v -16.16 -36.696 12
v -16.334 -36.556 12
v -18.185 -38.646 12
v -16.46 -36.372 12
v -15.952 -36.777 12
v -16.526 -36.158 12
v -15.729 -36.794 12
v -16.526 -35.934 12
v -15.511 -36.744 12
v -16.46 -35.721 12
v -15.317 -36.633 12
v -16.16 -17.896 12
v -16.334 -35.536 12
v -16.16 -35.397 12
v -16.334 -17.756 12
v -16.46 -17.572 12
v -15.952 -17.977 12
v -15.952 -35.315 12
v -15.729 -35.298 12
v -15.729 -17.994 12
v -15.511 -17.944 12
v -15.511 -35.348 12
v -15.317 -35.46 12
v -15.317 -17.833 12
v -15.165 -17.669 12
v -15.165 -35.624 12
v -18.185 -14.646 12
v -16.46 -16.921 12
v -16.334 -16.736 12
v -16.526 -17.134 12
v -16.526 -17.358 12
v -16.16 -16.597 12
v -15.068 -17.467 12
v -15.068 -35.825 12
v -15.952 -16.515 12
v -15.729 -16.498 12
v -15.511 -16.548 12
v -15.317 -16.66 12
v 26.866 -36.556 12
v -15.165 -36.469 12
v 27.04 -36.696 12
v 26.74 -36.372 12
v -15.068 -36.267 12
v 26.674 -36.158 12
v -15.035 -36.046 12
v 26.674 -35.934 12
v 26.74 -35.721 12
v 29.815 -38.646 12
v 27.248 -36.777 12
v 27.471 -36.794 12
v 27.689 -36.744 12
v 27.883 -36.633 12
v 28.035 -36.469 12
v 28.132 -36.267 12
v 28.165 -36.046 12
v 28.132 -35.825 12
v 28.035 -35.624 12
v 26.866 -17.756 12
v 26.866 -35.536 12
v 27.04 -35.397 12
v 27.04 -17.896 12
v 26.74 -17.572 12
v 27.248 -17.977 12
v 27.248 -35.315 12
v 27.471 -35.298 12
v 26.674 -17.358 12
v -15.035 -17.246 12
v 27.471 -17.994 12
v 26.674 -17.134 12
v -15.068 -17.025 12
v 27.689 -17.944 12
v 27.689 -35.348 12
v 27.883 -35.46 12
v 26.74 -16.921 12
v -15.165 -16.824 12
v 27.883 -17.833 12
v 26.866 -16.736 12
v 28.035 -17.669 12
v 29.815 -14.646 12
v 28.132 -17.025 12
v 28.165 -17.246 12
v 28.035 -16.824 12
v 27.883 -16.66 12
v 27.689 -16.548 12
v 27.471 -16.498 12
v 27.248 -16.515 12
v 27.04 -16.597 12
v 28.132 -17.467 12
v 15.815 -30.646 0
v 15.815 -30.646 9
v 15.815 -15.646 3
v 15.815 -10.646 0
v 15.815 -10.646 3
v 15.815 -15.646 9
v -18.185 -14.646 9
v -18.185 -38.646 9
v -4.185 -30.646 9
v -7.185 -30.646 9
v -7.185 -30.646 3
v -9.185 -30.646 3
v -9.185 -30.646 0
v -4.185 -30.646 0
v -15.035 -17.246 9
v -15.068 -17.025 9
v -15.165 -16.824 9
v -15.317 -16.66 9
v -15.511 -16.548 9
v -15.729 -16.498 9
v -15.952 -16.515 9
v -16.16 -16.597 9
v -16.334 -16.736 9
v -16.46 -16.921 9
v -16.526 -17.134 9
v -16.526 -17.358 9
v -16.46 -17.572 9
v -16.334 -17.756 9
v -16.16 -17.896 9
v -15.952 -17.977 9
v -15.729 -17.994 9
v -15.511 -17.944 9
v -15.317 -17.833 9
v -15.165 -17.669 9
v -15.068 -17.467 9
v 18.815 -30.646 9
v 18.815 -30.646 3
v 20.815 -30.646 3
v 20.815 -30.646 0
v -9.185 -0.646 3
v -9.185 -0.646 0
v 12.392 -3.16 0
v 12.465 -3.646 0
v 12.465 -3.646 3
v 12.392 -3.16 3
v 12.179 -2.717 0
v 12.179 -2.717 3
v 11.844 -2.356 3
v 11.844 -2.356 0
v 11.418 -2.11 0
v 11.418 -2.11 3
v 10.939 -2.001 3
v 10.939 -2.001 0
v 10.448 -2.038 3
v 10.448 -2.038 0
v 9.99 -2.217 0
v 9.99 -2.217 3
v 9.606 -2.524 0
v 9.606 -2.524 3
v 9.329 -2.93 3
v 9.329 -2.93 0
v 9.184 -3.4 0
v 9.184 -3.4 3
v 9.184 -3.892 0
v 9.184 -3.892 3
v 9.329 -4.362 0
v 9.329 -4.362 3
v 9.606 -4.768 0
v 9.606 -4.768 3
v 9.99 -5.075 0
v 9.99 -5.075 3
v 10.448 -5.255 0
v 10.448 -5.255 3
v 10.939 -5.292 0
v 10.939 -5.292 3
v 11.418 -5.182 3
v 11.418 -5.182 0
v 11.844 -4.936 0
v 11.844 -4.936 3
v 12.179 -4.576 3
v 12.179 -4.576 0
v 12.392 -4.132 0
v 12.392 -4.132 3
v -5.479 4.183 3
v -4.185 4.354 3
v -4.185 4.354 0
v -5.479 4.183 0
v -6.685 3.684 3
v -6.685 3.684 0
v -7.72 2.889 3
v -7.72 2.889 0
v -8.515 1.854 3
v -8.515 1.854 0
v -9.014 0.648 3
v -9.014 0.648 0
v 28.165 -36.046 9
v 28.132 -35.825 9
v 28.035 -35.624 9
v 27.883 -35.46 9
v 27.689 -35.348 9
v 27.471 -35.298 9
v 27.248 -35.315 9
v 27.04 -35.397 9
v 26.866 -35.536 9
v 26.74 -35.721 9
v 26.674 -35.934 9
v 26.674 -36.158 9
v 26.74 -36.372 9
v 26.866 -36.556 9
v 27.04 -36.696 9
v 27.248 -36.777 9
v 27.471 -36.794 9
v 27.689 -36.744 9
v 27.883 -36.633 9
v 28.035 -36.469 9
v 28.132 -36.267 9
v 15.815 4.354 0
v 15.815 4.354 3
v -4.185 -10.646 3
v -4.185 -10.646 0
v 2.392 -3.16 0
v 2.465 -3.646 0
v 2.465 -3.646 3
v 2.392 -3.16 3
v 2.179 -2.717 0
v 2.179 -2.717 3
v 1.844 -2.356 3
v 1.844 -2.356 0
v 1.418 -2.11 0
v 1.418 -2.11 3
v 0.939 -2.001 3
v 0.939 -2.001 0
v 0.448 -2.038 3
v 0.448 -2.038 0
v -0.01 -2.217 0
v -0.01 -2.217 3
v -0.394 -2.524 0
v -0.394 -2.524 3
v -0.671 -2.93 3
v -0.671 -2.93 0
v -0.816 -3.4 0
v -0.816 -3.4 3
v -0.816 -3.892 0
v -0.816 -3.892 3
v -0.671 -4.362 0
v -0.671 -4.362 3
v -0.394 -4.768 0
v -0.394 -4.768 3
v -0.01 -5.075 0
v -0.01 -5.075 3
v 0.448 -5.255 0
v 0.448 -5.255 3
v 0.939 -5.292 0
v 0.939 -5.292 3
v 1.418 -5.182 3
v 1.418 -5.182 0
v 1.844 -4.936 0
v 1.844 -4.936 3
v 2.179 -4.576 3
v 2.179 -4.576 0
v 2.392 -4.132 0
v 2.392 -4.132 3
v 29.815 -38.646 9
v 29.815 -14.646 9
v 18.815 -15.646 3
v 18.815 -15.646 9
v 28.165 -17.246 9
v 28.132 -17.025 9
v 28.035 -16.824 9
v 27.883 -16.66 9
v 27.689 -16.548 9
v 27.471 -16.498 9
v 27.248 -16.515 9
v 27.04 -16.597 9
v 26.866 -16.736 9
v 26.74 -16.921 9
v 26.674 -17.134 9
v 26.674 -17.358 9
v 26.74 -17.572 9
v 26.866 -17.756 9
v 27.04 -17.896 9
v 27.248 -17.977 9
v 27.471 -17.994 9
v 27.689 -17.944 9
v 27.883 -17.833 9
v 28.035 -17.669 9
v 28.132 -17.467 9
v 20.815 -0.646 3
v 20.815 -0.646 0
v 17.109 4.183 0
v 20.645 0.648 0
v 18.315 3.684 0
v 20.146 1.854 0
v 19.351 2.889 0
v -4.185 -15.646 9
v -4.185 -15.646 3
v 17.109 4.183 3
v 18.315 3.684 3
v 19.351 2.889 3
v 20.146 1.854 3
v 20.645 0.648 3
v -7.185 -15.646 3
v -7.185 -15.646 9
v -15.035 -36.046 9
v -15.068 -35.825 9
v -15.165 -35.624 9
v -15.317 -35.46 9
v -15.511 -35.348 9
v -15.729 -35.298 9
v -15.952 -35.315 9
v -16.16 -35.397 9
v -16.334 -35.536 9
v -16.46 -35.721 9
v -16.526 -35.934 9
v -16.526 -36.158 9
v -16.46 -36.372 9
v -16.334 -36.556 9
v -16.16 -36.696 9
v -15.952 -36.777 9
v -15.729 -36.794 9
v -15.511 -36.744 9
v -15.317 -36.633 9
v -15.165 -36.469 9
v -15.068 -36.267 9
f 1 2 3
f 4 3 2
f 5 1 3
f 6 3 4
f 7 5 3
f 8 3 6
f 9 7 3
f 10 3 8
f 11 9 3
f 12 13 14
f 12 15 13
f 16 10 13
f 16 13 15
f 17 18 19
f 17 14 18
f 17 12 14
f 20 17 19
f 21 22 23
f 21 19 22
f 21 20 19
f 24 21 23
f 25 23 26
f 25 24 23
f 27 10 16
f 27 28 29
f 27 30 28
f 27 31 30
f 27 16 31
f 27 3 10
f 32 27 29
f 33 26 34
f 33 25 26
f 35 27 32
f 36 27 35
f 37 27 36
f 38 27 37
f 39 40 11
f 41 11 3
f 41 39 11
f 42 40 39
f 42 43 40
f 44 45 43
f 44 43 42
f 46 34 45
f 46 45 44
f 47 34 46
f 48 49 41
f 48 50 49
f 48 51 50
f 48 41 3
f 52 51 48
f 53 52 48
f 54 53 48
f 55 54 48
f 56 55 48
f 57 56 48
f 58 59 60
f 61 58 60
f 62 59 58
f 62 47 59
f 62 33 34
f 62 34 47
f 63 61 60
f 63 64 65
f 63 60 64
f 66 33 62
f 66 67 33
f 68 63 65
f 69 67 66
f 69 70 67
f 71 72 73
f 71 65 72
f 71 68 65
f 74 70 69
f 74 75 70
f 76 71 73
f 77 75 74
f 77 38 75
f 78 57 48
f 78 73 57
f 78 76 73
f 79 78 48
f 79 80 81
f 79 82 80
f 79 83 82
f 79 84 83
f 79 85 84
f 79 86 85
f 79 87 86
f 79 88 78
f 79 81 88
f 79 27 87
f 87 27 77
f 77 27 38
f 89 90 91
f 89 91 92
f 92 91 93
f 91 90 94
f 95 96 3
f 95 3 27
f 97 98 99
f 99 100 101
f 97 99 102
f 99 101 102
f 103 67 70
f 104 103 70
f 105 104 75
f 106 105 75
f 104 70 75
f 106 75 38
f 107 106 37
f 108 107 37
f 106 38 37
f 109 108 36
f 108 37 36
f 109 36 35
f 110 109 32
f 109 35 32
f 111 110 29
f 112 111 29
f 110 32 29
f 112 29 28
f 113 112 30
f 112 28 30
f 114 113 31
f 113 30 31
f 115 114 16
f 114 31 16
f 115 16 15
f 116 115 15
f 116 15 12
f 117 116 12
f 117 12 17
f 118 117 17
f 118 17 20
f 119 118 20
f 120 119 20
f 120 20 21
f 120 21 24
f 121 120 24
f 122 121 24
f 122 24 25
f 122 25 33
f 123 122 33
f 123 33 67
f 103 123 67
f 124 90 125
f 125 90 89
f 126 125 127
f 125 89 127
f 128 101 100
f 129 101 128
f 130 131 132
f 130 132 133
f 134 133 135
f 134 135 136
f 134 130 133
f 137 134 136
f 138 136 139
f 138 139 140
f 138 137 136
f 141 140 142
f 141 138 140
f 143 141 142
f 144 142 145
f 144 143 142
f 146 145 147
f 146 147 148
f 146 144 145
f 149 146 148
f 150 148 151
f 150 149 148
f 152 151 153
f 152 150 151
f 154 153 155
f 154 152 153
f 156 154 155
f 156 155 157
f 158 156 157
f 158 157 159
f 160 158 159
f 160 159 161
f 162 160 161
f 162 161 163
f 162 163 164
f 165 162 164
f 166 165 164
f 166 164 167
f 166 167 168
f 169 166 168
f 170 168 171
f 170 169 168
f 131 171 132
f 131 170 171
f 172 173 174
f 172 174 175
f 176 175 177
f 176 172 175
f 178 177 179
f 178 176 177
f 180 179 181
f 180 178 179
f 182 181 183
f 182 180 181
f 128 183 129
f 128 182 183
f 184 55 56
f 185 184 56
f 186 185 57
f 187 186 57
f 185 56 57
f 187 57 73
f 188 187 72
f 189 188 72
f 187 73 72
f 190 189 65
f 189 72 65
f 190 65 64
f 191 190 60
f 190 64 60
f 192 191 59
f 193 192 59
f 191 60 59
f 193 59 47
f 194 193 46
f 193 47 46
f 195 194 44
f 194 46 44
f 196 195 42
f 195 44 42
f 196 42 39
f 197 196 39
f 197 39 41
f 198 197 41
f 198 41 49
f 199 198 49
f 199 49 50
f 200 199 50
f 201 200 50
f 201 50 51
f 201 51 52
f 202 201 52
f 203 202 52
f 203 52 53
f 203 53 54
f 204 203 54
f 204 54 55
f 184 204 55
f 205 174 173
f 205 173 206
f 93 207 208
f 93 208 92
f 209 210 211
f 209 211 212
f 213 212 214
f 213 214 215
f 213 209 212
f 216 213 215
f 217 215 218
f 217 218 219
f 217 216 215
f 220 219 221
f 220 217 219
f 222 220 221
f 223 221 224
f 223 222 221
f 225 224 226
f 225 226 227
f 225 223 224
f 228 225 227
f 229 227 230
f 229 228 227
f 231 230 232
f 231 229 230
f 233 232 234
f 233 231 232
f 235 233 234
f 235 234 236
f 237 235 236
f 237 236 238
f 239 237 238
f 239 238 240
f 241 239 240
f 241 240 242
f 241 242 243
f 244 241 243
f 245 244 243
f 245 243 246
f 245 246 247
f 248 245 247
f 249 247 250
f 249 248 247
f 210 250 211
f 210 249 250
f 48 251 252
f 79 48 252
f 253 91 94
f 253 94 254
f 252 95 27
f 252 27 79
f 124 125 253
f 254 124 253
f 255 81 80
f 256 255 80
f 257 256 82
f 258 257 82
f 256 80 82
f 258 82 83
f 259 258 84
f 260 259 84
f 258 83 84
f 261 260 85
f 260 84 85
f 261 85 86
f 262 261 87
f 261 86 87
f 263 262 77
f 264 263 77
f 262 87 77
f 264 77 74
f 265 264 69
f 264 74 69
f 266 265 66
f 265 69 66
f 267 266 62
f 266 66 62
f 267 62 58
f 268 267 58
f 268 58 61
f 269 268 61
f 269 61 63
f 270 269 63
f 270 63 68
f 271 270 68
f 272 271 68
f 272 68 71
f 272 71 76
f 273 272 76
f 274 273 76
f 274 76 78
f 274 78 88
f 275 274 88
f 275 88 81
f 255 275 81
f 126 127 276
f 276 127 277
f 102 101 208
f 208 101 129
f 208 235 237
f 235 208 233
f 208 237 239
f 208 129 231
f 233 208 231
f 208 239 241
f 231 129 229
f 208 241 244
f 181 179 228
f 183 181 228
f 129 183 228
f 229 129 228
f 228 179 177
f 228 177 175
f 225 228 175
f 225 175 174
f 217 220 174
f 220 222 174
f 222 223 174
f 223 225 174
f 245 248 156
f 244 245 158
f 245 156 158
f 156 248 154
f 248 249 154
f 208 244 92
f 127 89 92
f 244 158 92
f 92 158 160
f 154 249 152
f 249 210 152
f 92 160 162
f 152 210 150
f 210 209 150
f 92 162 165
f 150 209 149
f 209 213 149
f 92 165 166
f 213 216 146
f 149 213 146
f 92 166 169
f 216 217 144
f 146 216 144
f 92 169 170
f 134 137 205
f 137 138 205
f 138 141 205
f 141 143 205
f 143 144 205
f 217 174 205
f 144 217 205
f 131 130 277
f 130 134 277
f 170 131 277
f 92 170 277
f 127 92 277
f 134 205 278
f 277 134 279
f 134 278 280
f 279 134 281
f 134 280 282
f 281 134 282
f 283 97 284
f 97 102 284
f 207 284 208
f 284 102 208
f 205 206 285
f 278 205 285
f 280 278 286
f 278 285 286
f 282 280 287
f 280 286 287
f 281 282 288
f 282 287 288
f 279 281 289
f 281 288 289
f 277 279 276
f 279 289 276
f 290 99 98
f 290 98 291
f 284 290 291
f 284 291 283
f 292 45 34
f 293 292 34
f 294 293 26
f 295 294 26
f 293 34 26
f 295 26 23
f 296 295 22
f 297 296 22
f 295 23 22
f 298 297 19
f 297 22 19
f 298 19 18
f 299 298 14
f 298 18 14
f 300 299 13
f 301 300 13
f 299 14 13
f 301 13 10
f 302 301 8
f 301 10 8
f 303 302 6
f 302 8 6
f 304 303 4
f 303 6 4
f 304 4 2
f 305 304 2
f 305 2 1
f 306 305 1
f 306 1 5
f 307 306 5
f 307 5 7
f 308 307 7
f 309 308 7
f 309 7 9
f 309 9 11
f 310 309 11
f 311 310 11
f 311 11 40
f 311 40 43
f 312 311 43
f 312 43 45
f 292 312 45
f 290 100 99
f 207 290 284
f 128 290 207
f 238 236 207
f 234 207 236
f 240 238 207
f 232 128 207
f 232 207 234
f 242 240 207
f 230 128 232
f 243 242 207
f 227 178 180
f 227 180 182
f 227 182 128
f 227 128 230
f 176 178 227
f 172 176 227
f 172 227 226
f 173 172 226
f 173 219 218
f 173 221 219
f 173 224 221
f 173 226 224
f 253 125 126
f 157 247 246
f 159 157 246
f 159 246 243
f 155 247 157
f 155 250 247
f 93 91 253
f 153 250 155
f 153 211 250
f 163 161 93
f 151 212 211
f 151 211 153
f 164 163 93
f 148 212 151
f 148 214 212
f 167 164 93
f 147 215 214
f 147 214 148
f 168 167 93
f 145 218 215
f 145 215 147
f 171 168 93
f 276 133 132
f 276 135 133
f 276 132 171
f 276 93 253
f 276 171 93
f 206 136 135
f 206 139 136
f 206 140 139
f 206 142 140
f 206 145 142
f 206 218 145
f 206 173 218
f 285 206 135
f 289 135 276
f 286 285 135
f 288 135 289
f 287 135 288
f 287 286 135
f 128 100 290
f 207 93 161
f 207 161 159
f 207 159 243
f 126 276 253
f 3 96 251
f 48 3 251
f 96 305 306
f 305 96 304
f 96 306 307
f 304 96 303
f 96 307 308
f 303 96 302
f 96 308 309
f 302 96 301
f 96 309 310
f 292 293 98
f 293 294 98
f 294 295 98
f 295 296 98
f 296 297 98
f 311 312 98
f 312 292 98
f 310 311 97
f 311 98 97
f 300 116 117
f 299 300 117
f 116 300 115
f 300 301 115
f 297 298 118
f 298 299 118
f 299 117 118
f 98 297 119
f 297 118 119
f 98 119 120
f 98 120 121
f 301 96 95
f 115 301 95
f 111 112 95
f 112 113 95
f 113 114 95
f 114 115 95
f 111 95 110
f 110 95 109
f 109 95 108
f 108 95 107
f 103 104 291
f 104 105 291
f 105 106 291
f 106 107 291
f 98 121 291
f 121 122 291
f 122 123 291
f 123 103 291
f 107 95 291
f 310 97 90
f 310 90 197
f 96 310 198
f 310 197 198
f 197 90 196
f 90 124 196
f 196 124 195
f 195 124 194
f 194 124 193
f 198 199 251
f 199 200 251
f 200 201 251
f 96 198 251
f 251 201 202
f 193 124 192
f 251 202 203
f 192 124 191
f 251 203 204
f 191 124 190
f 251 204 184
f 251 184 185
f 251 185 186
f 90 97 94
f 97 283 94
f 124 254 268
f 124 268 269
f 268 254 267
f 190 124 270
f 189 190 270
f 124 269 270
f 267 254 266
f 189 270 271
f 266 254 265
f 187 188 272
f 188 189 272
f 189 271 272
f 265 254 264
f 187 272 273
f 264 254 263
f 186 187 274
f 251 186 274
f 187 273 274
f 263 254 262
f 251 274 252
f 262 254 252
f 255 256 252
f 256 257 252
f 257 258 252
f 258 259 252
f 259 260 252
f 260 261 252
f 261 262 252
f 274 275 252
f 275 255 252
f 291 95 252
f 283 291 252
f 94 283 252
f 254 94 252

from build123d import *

# Parameters (mm, degrees)
SKETCH_1_W          = 30
SKETCH_1_H          = 35
SKETCH_1_R          = 1.65
EXTRUDE_1_DEPTH     = 3
SKETCH_2_W          = 20
SKETCH_2_H          = 20
CUT_EXTRUDE_1_DEPTH = 6
SKETCH_3_W          = 3
SKETCH_3_H          = 15
EXTRUDE_2_DEPTH     = 6
SKETCH_4_W          = 48
SKETCH_4_H          = 24
EXTRUDE_3_DEPTH     = 3
SKETCH_6_R          = 0.75
CUT_EXTRUDE_2_DEPTH = 5


with BuildPart() as part:
    # 草图1 → 凸台-拉伸1 (new body)
    with BuildSketch(Plane.XY):
        with Locations((5.815384615, -13.146153846)):
            Rectangle(SKETCH_1_W, SKETCH_1_H)
        with Locations((0.815384615, -3.646153846)):
            Circle(SKETCH_1_R, mode=Mode.SUBTRACT)
        with Locations((10.815384615, -3.646153846)):
            Circle(SKETCH_1_R, mode=Mode.SUBTRACT)
    extrude(amount=EXTRUDE_1_DEPTH)

    # 草图2 → 切除-拉伸1 (cut)
    with BuildSketch(Plane.XY.offset(3)):
        with Locations((5.815384615, -20.646153846)):
            Rectangle(SKETCH_2_W, SKETCH_2_H)
        with BuildLine():
            Line((-9.184615385, -0.646153846), (-9.184615385, 4.353846154))
            Line((-9.184615385, 4.353846154), (-4.184615385, 4.353846154))
            ThreePointArc((-4.184615385, 4.353846154), (-7.720149291, 2.88938006), (-9.184615385, -0.646153846))
        make_face()
        with BuildLine():
            Line((20.815384615, -0.646153846), (20.815384615, 4.353846154))
            Line((20.815384615, 4.353846154), (15.815384615, 4.353846154))
            ThreePointArc((15.815384615, 4.353846154), (19.350918521, 2.88938006), (20.815384615, -0.646153846))
        make_face()
    extrude(amount=-CUT_EXTRUDE_1_DEPTH, mode=Mode.SUBTRACT)

    # 草图3 → 凸台-拉伸2 (add)
    with BuildSketch(Plane.XY.offset(3)):
        with Locations((-5.684615385, -23.146153846)):
            Rectangle(SKETCH_3_W, SKETCH_3_H)
        with Locations((17.315384615, -23.146153846)):
            Rectangle(SKETCH_3_W, SKETCH_3_H)
    extrude(amount=EXTRUDE_2_DEPTH)

    # 草图4 → 凸台-拉伸3 (add)
    with BuildSketch(Plane.XY.offset(9)):
        with Locations((5.815384615, -26.646153846)):
            Rectangle(SKETCH_4_W, SKETCH_4_H)
    extrude(amount=EXTRUDE_3_DEPTH)

    # 草图6 → 切除-拉伸2 (cut)
    with BuildSketch(Plane.XY.offset(12)):
        with Locations((-15.784615385, -17.246153846)):
            Circle(SKETCH_6_R)
        with Locations((-15.784615385, -36.046153846)):
            Circle(SKETCH_6_R)
        with Locations((27.415384615, -36.046153846)):
            Circle(SKETCH_6_R)
        with Locations((27.415384615, -17.246153846)):
            Circle(SKETCH_6_R)
    extrude(amount=-CUT_EXTRUDE_2_DEPTH, mode=Mode.SUBTRACT)


solid = part.part
